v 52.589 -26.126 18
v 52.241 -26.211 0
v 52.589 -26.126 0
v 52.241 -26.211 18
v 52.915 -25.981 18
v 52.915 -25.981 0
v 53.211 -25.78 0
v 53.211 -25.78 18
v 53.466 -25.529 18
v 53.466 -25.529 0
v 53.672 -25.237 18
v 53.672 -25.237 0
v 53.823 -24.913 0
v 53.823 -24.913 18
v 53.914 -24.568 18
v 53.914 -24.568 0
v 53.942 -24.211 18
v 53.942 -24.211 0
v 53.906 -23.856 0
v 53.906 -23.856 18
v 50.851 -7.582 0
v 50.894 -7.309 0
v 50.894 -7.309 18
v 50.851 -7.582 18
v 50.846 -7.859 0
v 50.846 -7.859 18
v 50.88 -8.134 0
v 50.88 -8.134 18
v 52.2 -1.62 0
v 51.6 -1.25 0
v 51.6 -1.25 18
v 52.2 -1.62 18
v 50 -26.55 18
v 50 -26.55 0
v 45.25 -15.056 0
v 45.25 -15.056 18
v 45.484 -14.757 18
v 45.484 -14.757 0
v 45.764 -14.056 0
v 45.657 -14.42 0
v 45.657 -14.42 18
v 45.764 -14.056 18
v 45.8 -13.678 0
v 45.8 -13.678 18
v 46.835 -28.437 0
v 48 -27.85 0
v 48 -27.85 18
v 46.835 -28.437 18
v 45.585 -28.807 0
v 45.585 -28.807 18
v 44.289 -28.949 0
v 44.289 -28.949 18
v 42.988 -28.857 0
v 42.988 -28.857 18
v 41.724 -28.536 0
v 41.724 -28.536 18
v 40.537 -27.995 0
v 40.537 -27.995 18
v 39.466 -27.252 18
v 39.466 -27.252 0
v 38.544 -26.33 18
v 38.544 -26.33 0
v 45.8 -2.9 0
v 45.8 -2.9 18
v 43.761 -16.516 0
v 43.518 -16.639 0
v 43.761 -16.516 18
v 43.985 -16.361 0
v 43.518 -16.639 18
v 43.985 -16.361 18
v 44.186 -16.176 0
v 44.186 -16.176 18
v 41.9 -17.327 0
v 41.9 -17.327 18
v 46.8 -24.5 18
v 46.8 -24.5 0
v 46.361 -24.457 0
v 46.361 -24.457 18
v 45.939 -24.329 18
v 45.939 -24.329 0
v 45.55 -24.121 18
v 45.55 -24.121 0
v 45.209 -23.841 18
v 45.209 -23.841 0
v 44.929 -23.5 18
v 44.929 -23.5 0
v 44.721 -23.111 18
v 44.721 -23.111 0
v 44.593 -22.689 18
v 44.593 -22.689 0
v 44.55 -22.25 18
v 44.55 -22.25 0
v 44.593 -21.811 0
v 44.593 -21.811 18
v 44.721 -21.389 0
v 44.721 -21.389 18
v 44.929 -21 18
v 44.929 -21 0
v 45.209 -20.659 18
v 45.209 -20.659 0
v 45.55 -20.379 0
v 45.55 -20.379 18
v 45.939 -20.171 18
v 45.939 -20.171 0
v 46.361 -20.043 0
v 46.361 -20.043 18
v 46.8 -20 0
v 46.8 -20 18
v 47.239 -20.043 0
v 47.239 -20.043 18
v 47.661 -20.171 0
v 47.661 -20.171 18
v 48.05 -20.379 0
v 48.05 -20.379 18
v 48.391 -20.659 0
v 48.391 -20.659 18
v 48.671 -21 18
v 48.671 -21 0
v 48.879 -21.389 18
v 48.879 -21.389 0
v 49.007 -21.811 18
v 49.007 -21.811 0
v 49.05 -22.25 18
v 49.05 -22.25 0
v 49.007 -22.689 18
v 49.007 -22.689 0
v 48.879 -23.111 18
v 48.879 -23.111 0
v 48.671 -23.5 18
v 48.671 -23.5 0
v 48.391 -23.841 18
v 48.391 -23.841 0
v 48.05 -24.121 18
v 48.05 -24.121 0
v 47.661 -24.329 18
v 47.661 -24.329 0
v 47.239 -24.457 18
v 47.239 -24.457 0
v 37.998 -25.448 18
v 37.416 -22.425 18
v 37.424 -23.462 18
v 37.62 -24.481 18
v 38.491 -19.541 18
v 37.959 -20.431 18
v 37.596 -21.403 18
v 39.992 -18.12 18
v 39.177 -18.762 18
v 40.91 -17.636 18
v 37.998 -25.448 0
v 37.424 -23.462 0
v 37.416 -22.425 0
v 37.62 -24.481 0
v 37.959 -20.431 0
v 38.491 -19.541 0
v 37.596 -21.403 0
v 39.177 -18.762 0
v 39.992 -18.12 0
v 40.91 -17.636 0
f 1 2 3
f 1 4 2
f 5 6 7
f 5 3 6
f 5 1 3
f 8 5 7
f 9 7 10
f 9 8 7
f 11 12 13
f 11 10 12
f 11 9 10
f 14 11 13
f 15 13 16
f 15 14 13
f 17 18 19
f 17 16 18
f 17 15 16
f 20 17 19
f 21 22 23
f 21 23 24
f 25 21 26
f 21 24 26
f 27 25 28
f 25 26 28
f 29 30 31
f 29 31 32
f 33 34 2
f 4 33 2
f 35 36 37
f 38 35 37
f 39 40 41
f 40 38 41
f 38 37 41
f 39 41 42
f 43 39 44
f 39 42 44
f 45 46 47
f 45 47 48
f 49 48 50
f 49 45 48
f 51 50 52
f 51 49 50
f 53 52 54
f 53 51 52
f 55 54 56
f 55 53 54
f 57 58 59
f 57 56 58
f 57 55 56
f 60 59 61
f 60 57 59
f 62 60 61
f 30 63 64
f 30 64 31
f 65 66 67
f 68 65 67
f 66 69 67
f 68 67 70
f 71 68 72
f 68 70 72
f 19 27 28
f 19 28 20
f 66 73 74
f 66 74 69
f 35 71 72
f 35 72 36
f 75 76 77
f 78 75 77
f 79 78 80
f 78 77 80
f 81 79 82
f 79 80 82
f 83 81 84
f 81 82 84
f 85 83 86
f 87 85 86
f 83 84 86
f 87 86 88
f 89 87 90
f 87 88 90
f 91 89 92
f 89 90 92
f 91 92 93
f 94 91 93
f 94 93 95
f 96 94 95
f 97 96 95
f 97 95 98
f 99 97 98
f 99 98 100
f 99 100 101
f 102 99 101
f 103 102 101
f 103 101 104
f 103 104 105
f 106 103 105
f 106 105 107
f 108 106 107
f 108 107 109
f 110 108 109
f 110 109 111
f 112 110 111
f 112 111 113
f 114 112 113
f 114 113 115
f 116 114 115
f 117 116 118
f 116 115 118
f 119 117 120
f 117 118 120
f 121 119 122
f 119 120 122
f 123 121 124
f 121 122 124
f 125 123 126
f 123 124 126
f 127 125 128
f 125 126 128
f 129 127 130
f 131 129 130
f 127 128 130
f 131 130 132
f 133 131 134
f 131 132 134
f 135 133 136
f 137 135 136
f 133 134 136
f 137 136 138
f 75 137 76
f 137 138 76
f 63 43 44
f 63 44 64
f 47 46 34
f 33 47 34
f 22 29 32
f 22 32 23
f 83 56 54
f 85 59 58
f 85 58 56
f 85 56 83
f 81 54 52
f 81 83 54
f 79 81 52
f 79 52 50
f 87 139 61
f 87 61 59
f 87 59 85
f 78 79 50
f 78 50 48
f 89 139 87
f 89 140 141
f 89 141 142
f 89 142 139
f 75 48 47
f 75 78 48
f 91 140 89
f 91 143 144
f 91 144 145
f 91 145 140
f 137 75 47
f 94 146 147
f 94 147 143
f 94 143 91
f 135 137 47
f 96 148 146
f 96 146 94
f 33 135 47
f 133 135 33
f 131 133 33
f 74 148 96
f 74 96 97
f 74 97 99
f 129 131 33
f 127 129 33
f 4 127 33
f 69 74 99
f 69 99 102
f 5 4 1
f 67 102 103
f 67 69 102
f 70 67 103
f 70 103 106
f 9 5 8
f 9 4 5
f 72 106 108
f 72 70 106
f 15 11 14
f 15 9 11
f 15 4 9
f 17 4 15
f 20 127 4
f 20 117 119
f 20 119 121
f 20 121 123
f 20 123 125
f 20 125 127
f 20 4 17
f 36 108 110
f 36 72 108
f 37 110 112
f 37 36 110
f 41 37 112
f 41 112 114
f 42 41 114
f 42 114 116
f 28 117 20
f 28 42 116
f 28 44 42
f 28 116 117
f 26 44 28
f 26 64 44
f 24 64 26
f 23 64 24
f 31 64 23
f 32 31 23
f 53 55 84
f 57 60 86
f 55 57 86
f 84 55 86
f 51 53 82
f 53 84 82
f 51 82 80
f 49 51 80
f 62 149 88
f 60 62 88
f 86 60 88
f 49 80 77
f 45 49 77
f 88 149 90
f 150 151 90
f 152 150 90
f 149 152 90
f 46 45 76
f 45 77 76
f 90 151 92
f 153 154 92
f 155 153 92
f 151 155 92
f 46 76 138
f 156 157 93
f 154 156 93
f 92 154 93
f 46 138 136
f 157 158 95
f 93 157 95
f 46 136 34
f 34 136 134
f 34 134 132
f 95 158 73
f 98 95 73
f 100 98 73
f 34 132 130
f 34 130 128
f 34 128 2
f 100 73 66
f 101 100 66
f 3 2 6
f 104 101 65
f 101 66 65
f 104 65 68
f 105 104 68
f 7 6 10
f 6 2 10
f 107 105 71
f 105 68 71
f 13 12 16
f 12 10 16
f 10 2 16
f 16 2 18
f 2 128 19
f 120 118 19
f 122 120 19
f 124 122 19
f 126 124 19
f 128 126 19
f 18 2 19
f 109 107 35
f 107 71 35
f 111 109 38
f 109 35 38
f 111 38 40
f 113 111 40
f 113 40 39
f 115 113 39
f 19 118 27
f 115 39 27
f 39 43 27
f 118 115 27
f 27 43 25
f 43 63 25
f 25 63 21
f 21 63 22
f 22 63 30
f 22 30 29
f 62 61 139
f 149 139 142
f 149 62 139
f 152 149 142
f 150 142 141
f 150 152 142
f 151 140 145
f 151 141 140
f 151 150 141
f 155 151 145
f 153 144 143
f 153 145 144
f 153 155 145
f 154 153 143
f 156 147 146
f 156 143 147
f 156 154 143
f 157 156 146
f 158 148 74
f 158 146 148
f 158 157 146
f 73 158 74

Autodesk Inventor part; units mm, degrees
ref_plane "YZ Plane" through (0, 0, 0) normal (1, 0, 0) x (0, 1, 0)
ref_plane "XZ Plane" through (0, 0, 0) normal (0, 1, 0) x (-1, 0, 0)
ref_plane "XY Plane" through (0, 0, 0) normal (0, 0, 1) x (1, 0, 0)
sketch "Sketch1" plane through (0, 0, 0) normal (0, 0, 1) x (1, 0, 0)
  line L0 (0, 0) -> (89.1946, 0) construction
  line L1 (89.1946, 0) -> (89.1946, -45.0628) construction
  line L2 (89.1946, -45.0628) -> (0, -45.0628) construction
  line L3 (0, -45.0628) -> (0, 0) construction
  line L4 (45.8, -14.477) -> (45.8, -2.9)
  line L5 (45.8, -2.9) -> (51.6, -1.25)
  line L6 (51.6, -1.25) -> (52.2, -1.62)
  line L7 (52.2, -1.62) -> (50.8, -7.72)
  line L8 (50.8, -7.72) -> (54.3, -25.9)
  line L9 (48, -27.85) -> (50, -26.55)
  line L10 (50, -26.55) -> (54.3, -25.9)
  arc A0 (38.5438, -26.3298) -> (48, -27.85) centre (44.1464, -21.65) ccw
  arc A1 (41.9, -17.327) -> (38.5438, -26.3298) centre (43.0964, -22.9) ccw
  line L11 (43.9, -16.477) -> (45.8, -14.477)
  line L12 (41.9, -17.327) -> (43.9, -16.477)
  dimension "d26" = 45.8
  dimension "d27" = 2.9
  dimension "d29" = 5.8
  dimension "d30" = 1.65
  dimension "d31" = 0.6
  dimension "d32" = 0.37
  dimension "d33" = 6.1
  dimension "d34" = 1.4
  dimension "d36" = 3.5
  dimension "d37" = 0.65
  dimension "d38" = 4.3
  dimension "d39" = 1.3
  dimension "d40" = 2
  dimension "d41" = 7.3
  dimension "d42" = 5.7
  dimension "d44" = 1.05
  dimension "d45" = 1.25
  dimension "d46" = 20
  dimension "d47" = 0.85
  dimension "d48" = 2
  dimension "d49" = 2
  dimension "d50" = 1.9
  dimension "d65" = 23
extrude "Extrusion2" add sketch "Sketch1" along normal blind 18
fillet "Fillet1" radius 2 4 edges at (54.3, -25.9, 9) (45.8, -14.477, 9) (43.9, -16.477, 9) (50.8, -7.72, 9)
sketch "Sketch3" plane through (0, 0, 18) normal (0, 0, 1) x (1, 0, 0)
  line L0 (45.8, -2.9) -> (45.8, -13.6784) projected
  point P0 (51.6, -1.25)
  point P1 (0, 0)
  point P2 (46.8, -22.25)
  dimension "d54" = 1
  dimension "d55" = 21
hole "Hole1" at (46.8, -22.25, 18) direction (0, 0, -1) diameter 4.5 end through all
properties part number "ExtruderSatoerCam"
